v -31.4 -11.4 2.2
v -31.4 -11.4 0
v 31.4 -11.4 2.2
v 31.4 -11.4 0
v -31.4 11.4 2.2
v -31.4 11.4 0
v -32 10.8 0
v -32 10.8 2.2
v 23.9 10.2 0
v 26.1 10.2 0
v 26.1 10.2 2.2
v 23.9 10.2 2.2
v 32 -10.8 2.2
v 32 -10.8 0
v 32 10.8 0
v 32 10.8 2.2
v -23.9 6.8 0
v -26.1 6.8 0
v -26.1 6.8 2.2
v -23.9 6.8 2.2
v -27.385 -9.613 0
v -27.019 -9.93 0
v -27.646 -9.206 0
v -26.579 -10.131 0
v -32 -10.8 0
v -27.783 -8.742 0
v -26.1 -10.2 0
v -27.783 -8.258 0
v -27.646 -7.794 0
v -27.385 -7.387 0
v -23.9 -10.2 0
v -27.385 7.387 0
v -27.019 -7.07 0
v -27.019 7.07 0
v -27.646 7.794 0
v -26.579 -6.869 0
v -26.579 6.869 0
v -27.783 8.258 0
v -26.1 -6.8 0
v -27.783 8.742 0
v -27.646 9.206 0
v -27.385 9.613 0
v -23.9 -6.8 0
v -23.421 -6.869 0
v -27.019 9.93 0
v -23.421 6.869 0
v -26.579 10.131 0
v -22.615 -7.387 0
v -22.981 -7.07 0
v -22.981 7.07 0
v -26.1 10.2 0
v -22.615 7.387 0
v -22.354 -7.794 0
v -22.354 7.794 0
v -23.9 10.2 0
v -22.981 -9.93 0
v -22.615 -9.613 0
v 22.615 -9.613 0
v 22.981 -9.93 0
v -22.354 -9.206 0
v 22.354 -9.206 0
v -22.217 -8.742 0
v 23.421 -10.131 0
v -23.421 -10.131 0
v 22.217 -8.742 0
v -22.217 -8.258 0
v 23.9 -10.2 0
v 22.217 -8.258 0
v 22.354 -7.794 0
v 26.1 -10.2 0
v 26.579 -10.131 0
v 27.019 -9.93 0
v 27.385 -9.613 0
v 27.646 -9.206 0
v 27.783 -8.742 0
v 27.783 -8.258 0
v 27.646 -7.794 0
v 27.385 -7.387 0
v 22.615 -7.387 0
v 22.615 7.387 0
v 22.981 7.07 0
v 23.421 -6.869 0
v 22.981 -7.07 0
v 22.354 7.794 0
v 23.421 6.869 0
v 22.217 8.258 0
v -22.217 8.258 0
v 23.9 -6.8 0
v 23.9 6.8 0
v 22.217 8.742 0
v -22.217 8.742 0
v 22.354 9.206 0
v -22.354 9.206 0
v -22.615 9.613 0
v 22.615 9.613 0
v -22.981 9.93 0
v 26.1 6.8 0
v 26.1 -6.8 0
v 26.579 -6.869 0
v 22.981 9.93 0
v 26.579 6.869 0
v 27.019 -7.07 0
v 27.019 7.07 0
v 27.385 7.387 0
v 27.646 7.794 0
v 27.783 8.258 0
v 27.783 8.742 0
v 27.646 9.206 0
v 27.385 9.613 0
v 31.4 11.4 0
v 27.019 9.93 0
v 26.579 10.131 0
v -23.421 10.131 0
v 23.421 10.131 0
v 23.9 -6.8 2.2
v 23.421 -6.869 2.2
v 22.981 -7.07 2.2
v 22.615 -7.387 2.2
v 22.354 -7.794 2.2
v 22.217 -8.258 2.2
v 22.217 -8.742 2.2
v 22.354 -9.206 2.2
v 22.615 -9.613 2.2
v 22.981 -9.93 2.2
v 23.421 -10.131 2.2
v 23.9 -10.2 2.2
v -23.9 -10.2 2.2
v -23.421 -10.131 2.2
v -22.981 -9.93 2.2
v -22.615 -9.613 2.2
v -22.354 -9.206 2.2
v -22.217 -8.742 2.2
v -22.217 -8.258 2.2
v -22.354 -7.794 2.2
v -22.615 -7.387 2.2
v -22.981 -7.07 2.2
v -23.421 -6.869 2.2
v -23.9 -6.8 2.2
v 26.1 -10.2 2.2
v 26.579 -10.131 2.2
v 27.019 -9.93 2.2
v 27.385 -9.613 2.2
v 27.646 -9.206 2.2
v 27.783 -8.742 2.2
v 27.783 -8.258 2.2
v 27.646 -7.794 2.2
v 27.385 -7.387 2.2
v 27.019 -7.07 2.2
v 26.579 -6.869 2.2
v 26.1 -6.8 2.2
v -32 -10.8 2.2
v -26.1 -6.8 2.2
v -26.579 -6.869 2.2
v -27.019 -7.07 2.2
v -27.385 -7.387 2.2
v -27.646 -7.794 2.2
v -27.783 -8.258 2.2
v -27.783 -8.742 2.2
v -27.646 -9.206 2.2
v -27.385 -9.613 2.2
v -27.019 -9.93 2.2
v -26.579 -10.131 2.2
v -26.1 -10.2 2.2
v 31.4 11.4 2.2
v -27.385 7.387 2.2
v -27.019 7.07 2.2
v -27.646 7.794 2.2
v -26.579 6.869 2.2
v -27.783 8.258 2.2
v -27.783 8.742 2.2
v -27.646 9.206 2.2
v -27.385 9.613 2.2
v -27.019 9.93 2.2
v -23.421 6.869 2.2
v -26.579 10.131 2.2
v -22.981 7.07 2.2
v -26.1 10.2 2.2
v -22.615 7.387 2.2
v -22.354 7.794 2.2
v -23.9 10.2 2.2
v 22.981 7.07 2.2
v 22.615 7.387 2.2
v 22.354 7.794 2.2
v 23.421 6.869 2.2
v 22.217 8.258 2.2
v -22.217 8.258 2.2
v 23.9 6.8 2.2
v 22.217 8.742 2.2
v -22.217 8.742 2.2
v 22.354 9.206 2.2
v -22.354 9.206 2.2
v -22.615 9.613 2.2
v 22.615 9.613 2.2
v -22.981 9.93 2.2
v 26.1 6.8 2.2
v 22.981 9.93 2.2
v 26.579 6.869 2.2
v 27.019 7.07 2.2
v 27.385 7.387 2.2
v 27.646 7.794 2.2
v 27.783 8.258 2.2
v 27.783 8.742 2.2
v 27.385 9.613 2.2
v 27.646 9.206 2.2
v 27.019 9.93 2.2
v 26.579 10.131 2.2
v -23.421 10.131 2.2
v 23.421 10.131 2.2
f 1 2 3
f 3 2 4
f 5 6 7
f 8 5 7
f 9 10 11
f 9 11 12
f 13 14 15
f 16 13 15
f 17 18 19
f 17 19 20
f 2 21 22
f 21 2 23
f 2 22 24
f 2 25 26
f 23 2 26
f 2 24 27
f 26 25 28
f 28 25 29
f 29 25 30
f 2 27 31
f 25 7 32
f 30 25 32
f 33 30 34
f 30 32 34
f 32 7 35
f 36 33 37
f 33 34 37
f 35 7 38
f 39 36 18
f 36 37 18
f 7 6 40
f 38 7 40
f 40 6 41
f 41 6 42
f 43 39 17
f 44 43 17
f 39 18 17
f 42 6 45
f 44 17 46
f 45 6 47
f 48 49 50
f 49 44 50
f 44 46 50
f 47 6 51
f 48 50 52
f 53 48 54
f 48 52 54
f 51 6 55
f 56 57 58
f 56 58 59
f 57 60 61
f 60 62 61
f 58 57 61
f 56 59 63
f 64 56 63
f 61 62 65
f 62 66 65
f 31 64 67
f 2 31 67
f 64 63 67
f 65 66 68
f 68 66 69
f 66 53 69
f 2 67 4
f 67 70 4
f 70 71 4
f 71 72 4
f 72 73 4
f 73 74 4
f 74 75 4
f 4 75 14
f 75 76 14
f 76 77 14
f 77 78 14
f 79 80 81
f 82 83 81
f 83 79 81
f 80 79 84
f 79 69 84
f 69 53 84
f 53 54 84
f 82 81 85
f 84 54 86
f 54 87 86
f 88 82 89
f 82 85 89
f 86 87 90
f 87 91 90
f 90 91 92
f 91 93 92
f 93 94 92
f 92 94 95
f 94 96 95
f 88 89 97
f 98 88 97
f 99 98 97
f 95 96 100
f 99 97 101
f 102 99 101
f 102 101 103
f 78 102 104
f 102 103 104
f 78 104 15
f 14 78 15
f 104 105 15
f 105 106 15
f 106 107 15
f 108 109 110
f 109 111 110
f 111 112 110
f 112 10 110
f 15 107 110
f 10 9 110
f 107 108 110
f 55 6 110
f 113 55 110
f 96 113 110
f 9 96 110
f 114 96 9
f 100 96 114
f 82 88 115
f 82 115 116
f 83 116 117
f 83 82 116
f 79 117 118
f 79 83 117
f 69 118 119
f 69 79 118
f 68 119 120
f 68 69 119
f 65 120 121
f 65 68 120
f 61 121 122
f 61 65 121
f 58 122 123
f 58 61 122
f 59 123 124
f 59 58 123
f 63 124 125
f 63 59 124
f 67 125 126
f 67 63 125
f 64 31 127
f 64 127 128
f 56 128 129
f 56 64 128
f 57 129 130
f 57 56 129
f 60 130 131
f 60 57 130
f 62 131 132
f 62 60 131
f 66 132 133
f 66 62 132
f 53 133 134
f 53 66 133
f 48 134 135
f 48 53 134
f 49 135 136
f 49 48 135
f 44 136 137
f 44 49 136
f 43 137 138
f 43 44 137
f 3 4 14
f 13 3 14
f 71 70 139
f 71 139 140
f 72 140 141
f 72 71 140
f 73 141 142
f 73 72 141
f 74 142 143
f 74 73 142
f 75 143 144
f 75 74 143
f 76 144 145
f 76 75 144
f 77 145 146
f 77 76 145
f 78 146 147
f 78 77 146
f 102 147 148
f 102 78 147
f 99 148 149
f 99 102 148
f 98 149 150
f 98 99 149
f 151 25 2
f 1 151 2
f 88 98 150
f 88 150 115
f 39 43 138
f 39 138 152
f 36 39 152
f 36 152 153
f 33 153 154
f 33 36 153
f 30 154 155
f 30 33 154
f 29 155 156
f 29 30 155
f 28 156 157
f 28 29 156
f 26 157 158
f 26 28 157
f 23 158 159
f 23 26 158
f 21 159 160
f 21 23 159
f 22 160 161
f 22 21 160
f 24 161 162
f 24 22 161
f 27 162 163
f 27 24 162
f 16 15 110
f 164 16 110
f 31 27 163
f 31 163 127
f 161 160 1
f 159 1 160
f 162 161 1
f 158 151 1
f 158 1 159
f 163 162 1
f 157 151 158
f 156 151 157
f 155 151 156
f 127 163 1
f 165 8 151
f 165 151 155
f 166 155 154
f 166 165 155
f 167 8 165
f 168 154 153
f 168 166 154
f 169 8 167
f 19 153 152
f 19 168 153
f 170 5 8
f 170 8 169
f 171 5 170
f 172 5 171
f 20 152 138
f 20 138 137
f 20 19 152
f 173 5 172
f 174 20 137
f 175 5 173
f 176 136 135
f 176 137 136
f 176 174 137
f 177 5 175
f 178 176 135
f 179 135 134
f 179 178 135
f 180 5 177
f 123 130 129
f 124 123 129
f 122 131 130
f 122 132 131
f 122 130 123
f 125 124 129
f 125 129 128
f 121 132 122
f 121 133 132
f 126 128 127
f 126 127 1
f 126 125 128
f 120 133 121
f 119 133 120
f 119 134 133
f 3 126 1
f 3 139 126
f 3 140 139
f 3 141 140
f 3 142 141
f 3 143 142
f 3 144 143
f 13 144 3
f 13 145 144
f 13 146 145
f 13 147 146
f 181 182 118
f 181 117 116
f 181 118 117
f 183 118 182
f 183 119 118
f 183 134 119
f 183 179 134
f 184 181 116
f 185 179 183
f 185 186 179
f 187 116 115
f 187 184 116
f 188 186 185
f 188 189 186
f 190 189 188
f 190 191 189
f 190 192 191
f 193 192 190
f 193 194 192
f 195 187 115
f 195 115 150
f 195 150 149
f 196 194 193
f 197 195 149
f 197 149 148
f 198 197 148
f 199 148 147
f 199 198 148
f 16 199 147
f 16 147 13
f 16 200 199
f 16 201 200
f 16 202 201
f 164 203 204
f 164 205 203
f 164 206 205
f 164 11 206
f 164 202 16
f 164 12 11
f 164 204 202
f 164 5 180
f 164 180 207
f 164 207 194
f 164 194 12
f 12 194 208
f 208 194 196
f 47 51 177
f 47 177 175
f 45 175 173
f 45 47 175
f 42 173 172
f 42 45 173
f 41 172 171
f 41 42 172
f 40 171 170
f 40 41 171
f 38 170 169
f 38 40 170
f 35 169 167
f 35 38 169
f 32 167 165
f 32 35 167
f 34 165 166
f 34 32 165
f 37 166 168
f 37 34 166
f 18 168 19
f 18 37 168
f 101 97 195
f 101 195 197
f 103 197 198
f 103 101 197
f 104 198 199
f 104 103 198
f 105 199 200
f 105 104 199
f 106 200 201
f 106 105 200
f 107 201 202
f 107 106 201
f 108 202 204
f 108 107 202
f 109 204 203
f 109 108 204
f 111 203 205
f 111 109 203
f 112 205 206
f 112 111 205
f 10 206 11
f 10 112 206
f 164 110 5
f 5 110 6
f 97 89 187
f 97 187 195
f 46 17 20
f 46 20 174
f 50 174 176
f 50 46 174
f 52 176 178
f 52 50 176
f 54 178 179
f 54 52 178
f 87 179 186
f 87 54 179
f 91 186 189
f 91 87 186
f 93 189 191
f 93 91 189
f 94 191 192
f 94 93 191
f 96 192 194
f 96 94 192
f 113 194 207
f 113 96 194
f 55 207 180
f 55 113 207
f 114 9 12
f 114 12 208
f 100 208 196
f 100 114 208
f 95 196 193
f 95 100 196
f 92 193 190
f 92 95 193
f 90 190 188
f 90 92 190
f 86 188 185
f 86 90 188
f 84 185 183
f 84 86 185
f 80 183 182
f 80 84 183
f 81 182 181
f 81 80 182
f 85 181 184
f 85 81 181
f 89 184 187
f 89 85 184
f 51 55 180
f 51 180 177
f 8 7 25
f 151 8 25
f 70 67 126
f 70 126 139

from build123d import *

# Parameters (mm, degrees)
FOUR_3_4_MM_POWER_PCB_SLOTS_NOMINAL_PA_DEPTH = 2.2


with BuildPart() as part:
    # Four 3.4 mm power PCB slots - nomina 2 → Four 3.4 mm power PCB slots - nominal pa (new body)
    with BuildSketch(Plane.XY):
        Polygon((-31.4, -11.4), (31.4, -11.4), (32, -10.8), (32, 10.8), (31.4, 11.4), (-31.4, 11.4), (-32, 10.8), (-32, -10.8), align=None)
        with BuildLine():
            Line((-26.1, -10.2), (-23.9, -10.2))
            ThreePointArc((-23.9, -10.2), (-22.2, -8.5), (-23.9, -6.8))
            Line((-23.9, -6.8), (-26.1, -6.8))
            ThreePointArc((-26.1, -6.8), (-27.8, -8.5), (-26.1, -10.2))
        make_face(mode=Mode.SUBTRACT)
        with BuildLine():
            Line((-26.1, 6.8), (-23.9, 6.8))
            ThreePointArc((-23.9, 6.8), (-22.2, 8.5), (-23.9, 10.2))
            Line((-23.9, 10.2), (-26.1, 10.2))
            ThreePointArc((-26.1, 10.2), (-27.8, 8.5), (-26.1, 6.8))
        make_face(mode=Mode.SUBTRACT)
        with BuildLine():
            Line((23.9, -10.2), (26.1, -10.2))
            ThreePointArc((26.1, -10.2), (27.8, -8.5), (26.1, -6.8))
            Line((26.1, -6.8), (23.9, -6.8))
            ThreePointArc((23.9, -6.8), (22.2, -8.5), (23.9, -10.2))
        make_face(mode=Mode.SUBTRACT)
        with BuildLine():
            Line((23.9, 6.8), (26.1, 6.8))
            ThreePointArc((26.1, 6.8), (27.8, 8.5), (26.1, 10.2))
            Line((26.1, 10.2), (23.9, 10.2))
            ThreePointArc((23.9, 10.2), (22.2, 8.5), (23.9, 6.8))
        make_face(mode=Mode.SUBTRACT)
    extrude(amount=FOUR_3_4_MM_POWER_PCB_SLOTS_NOMINAL_PA_DEPTH)


solid = part.part
